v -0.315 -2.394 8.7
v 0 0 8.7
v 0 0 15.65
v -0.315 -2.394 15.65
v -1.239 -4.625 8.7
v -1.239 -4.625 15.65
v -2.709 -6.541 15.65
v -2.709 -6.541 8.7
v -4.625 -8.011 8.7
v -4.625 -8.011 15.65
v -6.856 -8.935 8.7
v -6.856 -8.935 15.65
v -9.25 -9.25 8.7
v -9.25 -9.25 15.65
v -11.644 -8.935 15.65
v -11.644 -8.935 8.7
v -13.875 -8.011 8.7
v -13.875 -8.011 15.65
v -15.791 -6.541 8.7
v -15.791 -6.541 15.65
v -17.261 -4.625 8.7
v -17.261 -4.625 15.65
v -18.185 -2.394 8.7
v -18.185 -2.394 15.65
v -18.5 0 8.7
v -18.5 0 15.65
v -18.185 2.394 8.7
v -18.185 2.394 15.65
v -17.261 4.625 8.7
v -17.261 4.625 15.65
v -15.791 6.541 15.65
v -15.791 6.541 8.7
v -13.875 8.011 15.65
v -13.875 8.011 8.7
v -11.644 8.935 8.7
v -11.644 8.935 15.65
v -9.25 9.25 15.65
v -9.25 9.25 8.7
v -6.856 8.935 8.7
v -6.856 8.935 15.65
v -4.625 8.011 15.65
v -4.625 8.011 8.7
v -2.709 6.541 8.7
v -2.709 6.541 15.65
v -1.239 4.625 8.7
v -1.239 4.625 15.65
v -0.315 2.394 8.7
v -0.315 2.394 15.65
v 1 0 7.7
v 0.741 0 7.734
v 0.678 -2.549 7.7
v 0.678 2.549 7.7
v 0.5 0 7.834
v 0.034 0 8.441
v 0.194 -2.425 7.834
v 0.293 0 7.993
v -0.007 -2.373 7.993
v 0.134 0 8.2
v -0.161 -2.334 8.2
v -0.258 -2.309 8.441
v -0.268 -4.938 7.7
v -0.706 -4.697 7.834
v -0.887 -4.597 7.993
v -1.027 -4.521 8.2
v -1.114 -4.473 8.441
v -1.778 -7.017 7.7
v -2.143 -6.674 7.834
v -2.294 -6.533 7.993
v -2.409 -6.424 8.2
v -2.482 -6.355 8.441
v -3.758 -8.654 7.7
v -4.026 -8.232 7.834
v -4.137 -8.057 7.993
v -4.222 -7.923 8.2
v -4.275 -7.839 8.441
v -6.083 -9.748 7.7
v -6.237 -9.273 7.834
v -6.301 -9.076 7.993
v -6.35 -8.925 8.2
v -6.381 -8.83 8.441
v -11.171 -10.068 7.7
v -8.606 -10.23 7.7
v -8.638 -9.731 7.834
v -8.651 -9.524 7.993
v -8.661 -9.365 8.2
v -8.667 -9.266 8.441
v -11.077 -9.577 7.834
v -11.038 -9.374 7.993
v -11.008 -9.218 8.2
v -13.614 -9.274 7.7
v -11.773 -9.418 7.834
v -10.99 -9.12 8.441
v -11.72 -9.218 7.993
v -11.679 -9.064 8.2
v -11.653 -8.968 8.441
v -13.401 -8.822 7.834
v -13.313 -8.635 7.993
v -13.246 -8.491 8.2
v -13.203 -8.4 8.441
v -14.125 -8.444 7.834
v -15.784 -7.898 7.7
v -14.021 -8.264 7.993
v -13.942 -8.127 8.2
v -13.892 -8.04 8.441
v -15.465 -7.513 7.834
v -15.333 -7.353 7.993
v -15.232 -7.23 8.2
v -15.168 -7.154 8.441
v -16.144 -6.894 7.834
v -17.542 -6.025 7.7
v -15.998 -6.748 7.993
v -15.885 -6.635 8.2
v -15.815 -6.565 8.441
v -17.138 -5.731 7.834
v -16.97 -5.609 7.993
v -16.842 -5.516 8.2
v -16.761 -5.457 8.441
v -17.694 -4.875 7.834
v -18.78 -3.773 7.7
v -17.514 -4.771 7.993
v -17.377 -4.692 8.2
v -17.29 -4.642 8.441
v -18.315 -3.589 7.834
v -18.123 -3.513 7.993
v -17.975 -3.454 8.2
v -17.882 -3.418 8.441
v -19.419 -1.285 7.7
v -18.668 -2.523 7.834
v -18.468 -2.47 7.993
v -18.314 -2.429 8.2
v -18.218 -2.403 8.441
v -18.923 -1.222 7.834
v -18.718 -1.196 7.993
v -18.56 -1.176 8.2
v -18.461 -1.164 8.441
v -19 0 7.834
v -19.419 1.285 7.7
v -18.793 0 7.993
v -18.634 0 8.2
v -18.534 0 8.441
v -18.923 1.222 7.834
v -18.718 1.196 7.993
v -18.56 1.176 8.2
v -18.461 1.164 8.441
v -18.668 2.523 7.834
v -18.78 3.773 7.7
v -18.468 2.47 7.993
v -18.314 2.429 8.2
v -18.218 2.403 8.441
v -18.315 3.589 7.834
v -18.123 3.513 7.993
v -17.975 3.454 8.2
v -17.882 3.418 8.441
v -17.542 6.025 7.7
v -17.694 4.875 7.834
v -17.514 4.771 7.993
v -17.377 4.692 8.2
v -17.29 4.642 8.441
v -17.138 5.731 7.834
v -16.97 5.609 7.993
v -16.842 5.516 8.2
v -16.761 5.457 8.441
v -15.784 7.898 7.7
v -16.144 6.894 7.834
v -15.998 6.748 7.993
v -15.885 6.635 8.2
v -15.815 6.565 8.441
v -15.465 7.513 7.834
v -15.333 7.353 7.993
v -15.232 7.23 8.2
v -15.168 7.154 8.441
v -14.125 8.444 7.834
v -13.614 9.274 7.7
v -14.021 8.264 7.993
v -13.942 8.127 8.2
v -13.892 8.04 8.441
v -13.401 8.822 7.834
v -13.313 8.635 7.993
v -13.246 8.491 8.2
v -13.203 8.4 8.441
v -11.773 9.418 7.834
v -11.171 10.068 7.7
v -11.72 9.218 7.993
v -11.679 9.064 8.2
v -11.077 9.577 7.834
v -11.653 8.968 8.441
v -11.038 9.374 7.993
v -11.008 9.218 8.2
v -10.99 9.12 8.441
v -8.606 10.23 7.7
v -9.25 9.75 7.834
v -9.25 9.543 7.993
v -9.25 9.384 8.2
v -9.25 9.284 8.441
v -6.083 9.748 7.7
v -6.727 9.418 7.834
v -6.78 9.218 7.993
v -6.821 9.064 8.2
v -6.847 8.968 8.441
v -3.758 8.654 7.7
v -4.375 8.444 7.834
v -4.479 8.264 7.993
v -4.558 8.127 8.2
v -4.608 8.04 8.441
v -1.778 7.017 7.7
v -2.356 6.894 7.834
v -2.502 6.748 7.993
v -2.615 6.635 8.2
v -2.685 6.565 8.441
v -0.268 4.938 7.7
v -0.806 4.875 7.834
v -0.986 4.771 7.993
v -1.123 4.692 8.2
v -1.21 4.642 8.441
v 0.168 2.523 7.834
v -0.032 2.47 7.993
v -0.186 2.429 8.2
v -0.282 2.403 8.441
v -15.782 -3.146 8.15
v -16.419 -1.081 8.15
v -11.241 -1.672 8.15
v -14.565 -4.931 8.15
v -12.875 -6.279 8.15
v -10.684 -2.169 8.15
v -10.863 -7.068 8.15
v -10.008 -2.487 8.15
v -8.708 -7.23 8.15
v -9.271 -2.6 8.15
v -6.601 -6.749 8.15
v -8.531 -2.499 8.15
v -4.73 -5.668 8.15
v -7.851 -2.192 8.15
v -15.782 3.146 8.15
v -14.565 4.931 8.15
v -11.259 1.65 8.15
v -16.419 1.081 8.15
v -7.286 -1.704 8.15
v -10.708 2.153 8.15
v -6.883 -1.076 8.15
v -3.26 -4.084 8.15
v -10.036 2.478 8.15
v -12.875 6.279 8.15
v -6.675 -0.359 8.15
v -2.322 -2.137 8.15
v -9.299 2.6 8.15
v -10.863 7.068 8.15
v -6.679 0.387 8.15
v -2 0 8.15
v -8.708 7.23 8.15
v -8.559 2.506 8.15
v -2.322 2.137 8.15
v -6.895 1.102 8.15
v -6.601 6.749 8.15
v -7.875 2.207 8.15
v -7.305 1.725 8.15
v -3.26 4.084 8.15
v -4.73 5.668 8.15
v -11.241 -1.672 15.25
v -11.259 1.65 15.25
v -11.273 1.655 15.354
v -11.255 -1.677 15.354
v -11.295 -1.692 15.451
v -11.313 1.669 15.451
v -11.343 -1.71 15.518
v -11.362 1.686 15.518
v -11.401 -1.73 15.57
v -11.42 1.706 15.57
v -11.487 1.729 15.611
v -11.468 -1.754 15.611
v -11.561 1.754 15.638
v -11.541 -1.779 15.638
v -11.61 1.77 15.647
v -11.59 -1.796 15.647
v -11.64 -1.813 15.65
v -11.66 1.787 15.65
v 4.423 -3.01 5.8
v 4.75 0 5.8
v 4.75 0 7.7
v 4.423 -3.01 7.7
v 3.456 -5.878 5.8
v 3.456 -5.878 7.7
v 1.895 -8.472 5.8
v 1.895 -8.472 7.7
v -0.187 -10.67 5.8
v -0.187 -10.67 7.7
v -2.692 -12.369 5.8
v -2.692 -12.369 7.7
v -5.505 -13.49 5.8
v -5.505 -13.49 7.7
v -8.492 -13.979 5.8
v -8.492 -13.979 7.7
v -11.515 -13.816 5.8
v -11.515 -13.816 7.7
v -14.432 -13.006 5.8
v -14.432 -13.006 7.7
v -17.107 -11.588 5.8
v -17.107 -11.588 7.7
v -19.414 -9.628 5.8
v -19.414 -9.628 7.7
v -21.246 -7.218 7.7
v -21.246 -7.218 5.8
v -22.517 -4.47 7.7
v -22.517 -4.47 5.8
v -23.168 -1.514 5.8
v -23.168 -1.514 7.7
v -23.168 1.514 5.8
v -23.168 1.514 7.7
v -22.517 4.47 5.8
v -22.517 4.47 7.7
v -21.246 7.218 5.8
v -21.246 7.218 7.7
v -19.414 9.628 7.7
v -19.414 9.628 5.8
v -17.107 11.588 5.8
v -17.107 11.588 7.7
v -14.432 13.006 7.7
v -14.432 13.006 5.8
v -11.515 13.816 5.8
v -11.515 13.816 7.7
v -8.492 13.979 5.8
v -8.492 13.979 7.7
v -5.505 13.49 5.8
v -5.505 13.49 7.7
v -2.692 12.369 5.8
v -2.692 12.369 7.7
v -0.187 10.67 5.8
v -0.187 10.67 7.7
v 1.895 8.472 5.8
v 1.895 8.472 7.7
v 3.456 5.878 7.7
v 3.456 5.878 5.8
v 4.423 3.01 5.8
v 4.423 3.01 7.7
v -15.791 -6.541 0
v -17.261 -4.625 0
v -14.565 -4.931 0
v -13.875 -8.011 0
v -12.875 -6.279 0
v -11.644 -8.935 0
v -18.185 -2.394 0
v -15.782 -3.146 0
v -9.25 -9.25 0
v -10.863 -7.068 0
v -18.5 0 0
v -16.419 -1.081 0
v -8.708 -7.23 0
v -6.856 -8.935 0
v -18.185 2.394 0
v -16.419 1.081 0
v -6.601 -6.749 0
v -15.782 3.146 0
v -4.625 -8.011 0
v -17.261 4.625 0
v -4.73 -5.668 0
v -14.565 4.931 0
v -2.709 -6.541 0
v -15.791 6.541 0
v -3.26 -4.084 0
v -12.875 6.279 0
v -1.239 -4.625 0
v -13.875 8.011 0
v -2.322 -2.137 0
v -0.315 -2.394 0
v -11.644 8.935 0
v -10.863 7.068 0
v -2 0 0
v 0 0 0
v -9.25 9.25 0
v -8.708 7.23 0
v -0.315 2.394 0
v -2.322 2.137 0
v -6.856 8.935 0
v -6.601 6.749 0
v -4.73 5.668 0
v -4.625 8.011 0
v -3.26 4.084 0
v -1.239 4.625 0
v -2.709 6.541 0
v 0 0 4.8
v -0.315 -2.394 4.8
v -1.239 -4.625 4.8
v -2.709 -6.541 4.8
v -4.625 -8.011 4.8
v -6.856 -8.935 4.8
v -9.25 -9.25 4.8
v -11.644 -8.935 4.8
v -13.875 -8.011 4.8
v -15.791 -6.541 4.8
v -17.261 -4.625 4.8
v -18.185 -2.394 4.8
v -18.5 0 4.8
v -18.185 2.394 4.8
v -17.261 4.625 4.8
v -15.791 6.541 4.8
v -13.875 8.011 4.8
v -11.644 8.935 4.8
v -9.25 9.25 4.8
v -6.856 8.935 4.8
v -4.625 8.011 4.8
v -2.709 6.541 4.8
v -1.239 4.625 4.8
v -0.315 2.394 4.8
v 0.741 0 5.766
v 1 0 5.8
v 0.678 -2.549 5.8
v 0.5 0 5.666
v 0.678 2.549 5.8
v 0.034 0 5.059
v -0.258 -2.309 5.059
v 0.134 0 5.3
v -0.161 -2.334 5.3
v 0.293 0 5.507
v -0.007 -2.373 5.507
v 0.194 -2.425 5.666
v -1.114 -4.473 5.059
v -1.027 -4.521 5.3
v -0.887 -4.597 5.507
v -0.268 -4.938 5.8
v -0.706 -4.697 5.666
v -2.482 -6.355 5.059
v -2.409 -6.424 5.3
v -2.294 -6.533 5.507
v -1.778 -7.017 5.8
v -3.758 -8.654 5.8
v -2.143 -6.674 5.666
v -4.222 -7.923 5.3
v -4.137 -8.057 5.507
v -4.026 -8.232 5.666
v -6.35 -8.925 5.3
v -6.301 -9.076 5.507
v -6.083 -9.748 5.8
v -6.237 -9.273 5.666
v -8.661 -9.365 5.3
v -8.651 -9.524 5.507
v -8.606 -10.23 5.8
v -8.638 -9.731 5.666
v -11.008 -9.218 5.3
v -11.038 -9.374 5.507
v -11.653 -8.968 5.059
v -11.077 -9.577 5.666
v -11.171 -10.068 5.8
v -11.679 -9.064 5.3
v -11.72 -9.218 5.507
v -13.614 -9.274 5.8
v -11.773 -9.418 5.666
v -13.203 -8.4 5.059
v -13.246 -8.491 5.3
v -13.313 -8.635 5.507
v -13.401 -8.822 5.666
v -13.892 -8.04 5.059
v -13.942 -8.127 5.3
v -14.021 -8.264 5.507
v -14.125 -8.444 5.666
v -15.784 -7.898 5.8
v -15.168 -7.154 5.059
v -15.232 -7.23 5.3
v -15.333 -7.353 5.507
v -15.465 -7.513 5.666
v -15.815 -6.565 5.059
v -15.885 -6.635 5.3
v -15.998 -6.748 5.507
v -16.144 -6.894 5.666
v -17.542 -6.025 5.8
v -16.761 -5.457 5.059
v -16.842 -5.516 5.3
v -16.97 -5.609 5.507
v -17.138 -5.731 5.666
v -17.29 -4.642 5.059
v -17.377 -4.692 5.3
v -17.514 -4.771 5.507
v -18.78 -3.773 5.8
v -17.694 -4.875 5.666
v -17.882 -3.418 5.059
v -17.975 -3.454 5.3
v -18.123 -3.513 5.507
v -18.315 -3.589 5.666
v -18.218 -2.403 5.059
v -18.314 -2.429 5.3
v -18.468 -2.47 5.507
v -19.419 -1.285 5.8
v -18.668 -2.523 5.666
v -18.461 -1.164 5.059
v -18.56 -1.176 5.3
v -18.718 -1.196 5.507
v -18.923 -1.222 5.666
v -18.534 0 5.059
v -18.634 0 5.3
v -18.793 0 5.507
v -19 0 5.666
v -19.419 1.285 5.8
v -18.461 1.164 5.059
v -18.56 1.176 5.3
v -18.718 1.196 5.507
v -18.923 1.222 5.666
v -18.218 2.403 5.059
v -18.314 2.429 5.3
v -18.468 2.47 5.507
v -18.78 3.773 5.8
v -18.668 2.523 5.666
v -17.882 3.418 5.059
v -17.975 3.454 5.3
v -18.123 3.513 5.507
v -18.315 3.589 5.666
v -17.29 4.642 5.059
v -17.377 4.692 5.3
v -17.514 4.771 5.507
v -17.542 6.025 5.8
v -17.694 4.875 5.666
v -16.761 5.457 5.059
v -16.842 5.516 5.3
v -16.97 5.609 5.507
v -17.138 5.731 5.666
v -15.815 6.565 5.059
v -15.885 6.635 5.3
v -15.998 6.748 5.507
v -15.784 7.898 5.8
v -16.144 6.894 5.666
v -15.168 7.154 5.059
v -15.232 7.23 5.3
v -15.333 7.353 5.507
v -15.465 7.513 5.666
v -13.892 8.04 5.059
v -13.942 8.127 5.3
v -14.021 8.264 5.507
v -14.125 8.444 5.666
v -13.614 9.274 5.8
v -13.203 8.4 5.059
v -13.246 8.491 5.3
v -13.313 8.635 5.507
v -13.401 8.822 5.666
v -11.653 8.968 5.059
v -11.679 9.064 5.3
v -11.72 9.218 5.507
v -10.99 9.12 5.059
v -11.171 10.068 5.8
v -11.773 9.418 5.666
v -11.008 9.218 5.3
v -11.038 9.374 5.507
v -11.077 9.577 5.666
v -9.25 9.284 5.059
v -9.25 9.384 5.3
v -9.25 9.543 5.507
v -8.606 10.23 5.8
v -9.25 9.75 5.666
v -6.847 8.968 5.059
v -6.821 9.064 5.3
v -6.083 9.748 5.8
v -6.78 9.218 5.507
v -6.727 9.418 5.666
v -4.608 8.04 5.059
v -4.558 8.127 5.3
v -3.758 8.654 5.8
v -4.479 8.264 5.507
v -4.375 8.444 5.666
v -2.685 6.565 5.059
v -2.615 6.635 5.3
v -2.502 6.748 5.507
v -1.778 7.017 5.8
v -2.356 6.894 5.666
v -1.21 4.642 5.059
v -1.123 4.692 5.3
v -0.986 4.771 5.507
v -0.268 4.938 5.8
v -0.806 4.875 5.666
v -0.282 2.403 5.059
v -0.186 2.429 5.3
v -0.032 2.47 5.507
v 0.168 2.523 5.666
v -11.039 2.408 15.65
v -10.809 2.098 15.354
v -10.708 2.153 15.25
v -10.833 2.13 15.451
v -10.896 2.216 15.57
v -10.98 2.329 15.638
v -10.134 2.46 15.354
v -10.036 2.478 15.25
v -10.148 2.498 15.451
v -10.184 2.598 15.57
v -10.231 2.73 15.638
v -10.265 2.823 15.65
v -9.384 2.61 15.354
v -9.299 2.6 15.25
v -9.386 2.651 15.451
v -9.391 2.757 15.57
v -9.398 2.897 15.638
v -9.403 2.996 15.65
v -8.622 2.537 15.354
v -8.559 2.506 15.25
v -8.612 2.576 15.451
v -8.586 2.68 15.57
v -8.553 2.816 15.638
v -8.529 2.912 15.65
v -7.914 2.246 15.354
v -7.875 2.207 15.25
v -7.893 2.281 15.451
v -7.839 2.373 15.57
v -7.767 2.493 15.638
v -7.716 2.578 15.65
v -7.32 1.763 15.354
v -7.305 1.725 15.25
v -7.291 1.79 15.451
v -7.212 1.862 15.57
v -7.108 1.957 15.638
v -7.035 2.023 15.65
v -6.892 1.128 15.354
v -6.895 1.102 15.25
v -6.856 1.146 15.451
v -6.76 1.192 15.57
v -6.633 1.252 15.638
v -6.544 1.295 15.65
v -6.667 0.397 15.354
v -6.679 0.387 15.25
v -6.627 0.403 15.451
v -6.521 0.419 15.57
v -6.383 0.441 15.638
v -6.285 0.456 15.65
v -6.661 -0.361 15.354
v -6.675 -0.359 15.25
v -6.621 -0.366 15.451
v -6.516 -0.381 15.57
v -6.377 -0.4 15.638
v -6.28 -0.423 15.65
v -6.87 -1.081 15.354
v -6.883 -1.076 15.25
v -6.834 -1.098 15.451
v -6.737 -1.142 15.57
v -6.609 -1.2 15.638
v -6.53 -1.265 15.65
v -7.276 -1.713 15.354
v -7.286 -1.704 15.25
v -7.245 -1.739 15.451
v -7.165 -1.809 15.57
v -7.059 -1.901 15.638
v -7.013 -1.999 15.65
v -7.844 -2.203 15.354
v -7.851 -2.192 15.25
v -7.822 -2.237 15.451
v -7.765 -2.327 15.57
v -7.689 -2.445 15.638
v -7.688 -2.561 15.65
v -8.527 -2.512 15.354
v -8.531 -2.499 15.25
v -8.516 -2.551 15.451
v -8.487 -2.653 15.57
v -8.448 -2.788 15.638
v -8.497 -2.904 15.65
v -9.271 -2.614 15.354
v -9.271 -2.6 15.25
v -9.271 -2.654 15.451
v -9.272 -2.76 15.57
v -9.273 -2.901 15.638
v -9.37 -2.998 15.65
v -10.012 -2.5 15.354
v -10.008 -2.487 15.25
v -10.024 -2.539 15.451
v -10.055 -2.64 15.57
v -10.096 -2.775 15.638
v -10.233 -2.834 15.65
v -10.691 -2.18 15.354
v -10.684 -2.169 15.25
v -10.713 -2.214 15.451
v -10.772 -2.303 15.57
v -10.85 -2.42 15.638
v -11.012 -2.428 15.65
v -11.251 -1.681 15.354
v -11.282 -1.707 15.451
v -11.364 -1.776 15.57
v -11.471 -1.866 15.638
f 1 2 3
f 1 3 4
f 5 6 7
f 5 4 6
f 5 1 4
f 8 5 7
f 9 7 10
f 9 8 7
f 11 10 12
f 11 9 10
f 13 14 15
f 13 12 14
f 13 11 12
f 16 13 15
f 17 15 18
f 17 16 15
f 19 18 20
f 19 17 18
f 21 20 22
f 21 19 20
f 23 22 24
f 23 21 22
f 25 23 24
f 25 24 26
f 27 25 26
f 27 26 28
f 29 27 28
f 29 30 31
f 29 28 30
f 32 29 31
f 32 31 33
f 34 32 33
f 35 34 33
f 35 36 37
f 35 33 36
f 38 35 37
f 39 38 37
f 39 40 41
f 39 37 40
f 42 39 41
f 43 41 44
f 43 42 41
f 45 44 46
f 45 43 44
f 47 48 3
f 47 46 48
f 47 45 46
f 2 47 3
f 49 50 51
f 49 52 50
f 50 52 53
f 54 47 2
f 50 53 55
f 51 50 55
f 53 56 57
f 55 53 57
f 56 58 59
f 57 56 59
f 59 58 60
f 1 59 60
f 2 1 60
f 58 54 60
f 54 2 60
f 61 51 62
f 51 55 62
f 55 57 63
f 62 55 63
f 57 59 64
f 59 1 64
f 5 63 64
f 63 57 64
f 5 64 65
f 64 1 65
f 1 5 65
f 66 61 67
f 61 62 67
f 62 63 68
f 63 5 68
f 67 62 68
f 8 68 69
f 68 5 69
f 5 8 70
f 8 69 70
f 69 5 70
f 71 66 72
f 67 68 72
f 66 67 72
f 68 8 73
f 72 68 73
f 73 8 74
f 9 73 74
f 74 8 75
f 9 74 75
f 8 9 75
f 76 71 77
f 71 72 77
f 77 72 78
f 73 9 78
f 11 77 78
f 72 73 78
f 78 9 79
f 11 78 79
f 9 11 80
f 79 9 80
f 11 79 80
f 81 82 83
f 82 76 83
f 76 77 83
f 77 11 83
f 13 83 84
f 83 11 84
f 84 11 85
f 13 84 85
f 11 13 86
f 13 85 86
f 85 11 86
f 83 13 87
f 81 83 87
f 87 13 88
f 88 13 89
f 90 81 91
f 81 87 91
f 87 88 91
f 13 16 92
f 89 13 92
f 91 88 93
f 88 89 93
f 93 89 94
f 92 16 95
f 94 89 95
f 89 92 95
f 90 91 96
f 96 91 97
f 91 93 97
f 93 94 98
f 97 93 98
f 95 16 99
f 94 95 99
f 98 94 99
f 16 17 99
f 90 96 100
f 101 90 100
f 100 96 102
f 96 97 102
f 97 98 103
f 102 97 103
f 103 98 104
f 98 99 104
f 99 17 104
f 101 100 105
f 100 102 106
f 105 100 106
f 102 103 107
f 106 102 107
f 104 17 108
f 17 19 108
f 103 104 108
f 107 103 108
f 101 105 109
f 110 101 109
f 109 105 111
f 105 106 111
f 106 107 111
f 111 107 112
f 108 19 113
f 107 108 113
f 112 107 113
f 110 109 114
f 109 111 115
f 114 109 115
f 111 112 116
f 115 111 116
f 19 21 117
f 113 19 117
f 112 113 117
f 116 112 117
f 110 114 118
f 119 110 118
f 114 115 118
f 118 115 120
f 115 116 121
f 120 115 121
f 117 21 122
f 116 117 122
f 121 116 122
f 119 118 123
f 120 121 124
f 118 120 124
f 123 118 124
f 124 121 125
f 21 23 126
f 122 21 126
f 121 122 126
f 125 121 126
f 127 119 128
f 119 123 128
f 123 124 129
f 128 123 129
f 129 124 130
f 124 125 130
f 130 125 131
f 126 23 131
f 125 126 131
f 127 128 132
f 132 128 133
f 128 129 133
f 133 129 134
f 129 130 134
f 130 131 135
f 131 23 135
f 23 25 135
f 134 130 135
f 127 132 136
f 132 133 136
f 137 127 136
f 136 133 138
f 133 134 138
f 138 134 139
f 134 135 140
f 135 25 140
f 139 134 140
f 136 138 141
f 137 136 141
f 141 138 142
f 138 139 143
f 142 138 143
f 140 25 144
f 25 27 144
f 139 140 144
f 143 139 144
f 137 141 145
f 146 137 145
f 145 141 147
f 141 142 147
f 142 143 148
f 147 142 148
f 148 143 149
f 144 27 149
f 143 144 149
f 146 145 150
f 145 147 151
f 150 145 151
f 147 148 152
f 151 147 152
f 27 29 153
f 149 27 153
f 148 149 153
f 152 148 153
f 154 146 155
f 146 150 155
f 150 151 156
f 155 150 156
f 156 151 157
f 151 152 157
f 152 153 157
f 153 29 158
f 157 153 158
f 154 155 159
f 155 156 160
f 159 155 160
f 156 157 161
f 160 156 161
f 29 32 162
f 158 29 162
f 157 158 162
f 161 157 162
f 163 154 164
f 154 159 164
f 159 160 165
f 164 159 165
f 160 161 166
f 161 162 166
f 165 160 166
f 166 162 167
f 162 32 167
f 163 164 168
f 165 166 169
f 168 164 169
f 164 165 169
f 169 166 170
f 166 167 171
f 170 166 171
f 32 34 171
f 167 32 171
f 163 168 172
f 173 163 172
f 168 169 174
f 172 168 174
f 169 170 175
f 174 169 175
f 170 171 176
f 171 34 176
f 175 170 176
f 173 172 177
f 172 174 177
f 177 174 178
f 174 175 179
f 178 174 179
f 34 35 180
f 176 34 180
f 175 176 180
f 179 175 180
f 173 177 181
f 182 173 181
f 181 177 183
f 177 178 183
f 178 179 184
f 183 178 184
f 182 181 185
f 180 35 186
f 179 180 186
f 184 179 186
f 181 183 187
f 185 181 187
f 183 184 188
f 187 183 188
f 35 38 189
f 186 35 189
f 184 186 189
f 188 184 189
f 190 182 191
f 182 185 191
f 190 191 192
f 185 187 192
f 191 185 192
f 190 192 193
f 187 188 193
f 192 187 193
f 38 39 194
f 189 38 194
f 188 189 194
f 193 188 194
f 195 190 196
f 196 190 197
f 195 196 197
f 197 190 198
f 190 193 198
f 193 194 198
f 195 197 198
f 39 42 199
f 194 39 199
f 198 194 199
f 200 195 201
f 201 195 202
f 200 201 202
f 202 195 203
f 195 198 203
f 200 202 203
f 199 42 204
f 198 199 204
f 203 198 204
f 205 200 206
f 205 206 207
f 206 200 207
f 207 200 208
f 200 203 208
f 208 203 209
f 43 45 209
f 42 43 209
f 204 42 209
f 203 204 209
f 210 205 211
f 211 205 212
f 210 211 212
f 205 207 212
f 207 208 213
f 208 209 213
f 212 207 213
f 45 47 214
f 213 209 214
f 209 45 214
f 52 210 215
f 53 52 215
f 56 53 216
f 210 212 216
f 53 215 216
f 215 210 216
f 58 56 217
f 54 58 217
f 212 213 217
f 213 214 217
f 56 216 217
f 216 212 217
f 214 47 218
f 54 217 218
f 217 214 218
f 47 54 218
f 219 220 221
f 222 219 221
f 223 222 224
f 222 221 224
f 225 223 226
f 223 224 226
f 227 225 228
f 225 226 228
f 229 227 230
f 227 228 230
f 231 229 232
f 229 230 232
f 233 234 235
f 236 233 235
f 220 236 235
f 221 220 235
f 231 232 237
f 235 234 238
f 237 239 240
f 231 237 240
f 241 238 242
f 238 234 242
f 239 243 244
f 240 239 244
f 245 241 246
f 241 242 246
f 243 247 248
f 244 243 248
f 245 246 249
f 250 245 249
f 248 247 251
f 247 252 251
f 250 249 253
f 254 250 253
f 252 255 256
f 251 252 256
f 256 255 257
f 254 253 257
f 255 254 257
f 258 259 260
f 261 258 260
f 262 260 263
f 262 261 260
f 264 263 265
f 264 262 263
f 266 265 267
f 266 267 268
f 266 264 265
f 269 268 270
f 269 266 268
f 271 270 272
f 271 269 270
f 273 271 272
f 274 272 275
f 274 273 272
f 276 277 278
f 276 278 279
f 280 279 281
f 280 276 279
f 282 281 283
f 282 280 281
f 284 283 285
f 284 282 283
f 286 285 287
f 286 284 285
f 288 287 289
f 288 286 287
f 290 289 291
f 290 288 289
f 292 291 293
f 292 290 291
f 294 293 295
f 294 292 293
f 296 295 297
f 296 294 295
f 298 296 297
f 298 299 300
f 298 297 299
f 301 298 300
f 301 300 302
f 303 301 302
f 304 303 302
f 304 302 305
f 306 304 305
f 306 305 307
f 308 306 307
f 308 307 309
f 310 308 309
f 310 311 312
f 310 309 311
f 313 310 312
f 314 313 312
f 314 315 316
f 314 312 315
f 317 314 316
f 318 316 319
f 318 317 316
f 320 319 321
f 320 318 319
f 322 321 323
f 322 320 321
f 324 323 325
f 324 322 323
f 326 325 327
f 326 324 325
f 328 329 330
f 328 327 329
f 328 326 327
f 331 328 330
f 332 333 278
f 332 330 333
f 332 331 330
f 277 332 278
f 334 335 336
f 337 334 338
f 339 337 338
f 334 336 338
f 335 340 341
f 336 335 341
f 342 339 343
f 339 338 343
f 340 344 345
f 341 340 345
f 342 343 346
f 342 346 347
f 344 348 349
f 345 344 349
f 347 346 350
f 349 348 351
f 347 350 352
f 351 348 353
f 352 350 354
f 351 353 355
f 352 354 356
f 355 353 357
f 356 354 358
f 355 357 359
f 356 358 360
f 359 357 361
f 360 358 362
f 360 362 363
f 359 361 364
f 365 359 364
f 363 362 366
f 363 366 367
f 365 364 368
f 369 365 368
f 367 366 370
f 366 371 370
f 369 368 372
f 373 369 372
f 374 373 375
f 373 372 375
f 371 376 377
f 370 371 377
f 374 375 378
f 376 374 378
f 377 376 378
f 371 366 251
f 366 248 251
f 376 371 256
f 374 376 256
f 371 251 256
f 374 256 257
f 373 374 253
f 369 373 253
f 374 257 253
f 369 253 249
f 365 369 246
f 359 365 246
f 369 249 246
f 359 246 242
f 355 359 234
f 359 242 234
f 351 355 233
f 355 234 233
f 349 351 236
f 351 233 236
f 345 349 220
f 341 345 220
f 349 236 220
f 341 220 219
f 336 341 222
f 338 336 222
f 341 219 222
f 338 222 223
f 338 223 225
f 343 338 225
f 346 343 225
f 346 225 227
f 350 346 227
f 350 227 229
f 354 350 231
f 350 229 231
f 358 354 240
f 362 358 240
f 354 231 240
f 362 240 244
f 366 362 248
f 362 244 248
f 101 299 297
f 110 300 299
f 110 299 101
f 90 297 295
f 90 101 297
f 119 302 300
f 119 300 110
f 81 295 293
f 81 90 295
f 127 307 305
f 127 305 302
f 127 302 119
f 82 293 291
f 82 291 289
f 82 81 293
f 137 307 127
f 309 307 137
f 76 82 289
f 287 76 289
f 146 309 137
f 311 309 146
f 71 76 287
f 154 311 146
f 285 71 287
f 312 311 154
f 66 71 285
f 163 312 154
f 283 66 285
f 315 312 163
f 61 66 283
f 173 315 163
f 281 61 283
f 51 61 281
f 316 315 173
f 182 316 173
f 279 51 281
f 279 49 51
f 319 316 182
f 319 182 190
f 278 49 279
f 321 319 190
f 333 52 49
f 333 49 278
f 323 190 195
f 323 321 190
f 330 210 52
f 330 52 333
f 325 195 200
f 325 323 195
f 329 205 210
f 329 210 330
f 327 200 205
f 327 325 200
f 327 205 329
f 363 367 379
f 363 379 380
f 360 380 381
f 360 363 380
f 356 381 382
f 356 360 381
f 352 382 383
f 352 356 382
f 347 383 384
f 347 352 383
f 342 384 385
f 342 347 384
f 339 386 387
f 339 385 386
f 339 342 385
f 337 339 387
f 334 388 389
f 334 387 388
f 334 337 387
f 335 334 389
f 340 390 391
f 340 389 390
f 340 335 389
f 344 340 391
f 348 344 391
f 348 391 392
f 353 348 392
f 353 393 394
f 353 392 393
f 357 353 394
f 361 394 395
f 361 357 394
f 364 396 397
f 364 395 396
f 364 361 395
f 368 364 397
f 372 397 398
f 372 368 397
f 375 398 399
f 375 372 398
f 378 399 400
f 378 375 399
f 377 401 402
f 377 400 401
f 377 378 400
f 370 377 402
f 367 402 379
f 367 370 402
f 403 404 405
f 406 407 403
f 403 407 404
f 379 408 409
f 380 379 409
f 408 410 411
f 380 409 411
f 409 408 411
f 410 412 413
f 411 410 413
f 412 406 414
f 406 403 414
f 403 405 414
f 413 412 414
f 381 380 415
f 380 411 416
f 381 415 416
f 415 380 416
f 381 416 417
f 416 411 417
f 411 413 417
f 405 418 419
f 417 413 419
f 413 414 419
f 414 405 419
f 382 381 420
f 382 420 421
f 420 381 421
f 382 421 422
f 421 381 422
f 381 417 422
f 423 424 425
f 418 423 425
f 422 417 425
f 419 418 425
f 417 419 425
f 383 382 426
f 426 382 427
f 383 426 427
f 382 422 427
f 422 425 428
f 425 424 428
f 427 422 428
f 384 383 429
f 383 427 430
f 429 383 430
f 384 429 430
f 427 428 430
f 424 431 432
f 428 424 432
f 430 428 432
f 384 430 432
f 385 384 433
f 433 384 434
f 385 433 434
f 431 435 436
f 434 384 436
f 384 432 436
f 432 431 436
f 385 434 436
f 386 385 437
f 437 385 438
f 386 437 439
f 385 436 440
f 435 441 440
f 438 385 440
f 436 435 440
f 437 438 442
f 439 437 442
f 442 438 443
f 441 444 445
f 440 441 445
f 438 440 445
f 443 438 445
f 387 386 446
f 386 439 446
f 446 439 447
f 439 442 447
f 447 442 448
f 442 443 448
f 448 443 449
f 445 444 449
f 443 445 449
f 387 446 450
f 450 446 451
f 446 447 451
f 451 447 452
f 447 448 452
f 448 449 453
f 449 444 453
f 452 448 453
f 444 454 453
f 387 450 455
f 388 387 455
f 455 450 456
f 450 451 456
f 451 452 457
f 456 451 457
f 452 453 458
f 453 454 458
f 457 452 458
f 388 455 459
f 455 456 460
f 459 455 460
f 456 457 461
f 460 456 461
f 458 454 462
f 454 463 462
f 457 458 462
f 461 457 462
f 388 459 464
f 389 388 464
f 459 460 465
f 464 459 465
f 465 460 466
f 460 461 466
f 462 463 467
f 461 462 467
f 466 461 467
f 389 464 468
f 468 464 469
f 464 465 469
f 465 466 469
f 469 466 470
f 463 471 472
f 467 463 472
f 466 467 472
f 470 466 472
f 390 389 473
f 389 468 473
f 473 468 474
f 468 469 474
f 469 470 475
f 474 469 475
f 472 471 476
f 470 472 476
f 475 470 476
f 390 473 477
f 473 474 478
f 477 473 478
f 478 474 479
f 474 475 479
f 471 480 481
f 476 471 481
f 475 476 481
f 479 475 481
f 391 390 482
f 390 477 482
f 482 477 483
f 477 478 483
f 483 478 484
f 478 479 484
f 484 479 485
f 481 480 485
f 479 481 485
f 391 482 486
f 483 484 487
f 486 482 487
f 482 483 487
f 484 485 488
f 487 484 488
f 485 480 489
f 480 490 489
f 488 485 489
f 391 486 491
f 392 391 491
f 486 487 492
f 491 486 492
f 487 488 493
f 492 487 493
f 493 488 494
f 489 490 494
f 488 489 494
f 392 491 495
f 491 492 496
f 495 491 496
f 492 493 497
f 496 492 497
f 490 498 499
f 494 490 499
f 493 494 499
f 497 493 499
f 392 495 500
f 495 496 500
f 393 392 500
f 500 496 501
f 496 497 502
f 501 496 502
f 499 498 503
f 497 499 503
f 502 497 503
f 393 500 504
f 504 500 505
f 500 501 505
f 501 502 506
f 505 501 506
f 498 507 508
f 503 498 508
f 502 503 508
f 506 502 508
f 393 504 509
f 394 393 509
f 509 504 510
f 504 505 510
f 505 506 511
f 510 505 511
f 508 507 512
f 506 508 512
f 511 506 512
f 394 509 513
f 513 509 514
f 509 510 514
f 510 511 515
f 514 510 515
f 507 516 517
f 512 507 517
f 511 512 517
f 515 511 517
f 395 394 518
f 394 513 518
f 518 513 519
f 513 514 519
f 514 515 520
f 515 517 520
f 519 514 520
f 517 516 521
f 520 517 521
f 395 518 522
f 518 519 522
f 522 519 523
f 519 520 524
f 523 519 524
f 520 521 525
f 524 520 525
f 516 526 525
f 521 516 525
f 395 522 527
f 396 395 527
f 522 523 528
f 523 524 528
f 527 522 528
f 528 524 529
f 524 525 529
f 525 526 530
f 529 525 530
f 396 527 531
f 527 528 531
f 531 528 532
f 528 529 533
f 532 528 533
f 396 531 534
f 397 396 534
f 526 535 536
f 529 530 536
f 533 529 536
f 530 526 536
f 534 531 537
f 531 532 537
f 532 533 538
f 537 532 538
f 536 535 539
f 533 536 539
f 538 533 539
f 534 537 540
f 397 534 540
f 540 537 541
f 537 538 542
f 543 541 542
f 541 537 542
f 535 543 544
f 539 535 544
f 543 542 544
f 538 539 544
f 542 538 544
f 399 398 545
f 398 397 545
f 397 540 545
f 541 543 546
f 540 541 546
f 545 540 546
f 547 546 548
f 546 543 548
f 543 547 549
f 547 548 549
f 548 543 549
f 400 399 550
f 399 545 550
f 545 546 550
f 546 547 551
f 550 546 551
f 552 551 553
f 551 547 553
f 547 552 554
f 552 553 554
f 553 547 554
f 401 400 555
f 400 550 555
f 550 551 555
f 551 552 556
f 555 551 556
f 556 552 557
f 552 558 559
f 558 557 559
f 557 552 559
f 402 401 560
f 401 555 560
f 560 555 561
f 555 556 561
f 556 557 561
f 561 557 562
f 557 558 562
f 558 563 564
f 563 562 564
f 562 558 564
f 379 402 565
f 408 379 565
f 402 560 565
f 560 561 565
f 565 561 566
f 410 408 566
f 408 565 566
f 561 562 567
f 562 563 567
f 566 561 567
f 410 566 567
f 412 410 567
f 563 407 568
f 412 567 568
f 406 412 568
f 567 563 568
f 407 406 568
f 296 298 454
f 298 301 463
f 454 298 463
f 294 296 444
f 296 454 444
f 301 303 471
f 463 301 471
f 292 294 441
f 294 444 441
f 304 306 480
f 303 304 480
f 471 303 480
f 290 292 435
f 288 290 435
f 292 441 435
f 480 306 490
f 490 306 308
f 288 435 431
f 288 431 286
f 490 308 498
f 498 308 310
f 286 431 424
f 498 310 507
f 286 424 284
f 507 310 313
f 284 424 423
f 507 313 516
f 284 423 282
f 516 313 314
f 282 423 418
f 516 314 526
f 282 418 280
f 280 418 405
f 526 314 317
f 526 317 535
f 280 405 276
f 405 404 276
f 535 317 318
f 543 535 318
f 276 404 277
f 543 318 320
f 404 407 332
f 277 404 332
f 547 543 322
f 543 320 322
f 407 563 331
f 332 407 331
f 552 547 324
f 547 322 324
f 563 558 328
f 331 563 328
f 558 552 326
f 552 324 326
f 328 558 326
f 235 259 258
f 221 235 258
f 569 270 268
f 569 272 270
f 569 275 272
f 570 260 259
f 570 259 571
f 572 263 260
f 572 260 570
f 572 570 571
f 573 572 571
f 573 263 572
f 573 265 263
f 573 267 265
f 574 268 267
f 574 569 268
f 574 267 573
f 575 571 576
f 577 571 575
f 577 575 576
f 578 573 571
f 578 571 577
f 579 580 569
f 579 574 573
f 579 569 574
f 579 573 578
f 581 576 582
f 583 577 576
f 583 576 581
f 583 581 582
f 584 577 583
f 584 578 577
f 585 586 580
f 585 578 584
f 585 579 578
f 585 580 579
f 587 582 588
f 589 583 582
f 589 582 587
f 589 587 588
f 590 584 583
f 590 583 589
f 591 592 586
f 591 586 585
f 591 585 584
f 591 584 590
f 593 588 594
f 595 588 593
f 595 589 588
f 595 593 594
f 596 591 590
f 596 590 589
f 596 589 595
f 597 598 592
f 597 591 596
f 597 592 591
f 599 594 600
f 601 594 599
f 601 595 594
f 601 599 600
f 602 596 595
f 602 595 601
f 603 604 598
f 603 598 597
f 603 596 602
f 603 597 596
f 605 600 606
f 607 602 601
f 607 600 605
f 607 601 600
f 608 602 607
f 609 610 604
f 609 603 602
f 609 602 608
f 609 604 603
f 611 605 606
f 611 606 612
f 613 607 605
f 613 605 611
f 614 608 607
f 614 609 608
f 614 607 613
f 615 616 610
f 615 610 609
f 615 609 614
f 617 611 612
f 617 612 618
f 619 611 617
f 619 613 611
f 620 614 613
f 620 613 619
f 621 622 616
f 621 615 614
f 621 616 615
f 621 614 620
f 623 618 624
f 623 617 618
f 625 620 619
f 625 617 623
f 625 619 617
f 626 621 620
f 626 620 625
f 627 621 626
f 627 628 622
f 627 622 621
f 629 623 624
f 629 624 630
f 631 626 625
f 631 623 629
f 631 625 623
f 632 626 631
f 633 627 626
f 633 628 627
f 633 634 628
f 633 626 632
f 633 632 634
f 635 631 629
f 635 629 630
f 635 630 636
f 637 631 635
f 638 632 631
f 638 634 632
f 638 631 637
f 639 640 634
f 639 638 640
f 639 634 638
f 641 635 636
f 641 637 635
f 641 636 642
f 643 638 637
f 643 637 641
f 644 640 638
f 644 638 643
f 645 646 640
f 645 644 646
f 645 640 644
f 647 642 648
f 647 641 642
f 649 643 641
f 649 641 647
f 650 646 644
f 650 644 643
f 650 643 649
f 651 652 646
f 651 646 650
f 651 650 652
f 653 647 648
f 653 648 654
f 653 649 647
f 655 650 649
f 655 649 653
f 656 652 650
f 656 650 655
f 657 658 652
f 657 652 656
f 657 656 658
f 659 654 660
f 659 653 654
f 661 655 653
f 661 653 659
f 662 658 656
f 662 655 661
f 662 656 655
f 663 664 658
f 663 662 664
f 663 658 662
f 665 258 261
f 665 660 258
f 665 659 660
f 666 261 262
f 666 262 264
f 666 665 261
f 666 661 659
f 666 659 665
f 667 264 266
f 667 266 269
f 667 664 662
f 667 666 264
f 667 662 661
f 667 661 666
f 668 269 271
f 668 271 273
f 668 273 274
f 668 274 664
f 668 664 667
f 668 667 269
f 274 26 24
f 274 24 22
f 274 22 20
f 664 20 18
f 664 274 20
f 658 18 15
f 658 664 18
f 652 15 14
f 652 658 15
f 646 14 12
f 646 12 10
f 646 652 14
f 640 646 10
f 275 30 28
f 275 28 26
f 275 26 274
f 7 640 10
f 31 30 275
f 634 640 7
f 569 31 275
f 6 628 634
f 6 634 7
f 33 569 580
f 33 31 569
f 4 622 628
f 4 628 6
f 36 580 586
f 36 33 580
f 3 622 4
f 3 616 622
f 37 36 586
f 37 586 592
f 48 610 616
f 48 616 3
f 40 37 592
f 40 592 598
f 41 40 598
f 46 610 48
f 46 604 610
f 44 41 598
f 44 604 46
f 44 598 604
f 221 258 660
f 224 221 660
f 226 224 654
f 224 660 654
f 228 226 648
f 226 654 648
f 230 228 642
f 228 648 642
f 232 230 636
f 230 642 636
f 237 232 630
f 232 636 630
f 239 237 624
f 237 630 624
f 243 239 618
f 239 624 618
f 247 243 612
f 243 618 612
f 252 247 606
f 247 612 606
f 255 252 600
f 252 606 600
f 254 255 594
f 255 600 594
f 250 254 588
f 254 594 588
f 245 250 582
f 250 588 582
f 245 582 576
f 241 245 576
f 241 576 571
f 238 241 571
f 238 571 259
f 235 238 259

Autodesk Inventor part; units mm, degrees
ref_plane "YZ Plane" through (0, 0, 0) normal (1, 0, 0) x (0, 1, 0)
ref_plane "XZ Plane" through (0, 0, 0) normal (0, 1, 0) x (-1, 0, 0)
ref_plane "XY Plane" through (0, 0, 0) normal (0, 0, 1) x (1, 0, 0)
sketch "Sketch1" plane through (0, 0, 0) normal (0, 1, 0) x (-1, 0, 0)
  line L0 (0, 0) -> (2, 0)
  line L1 (2, 0) -> (2, 8.15)
  line L2 (2, 8.15) -> (0, 8.15)
  line L3 (0, 8.15) -> (0, 0)
  line L4 (0, 8.15) -> (9.25, 8.15)
  line L5 (9.25, 8.15) -> (9.25, 15.65)
  line L6 (9.25, 15.65) -> (0, 15.65)
  line L7 (0, 15.65) -> (0, 8.15)
  line L8 (0, 7.7) -> (-4.75, 7.7)
  line L9 (-4.75, 7.7) -> (-4.75, 5.8)
  line L10 (-4.75, 5.8) -> (0, 5.8)
  line L11 (0, 5.8) -> (0, 7.7)
  point P0 (0, 5.8)
  dimension "d1" = 7.25
  dimension "d2" = 2
  dimension "d3" = 7.5
  dimension "d4" = 8.15
  dimension "d10" = 14
  dimension "d12" = 1.9
  dimension "d13" = 7.95
revolve "Revolution1" add sketch "Sketch1" angle 360 about axis through (-9.25, 0, 8.15) along (0, 0, 1)
sketch "Sketch2" plane through (-9.25, 0, 15.65) normal (0, 0, 1) x (1, 0, 0)
  circle A0 centre (0, 0) radius 2.6
  line L0 (-2.0092, 1.6502) -> (-1.9908, -1.6724)
  circle A1 centre (0, 0) radius 9.25 projected
  circle A2 centre (0, 0) radius 9.4
  point P0 (9.25, 0)
  dimension "d6" = 5.2
  dimension "d7" = 2
extrude "Extrusion1" cut sketch "Sketch2" against normal blind 10 contours A0 L0 picked at (-0.3829, 0.5768)
fillet "Fillet1" radius 1 2 edges at (-18.5, 0, 7.7) (-18.5, 0, 5.8)
fillet "Fillet2" radius 0.4 2 edges at (-6.65, 0.0144, 15.65) (-11.25, -0.0111, 15.65)
properties part number "Knob_adp"
